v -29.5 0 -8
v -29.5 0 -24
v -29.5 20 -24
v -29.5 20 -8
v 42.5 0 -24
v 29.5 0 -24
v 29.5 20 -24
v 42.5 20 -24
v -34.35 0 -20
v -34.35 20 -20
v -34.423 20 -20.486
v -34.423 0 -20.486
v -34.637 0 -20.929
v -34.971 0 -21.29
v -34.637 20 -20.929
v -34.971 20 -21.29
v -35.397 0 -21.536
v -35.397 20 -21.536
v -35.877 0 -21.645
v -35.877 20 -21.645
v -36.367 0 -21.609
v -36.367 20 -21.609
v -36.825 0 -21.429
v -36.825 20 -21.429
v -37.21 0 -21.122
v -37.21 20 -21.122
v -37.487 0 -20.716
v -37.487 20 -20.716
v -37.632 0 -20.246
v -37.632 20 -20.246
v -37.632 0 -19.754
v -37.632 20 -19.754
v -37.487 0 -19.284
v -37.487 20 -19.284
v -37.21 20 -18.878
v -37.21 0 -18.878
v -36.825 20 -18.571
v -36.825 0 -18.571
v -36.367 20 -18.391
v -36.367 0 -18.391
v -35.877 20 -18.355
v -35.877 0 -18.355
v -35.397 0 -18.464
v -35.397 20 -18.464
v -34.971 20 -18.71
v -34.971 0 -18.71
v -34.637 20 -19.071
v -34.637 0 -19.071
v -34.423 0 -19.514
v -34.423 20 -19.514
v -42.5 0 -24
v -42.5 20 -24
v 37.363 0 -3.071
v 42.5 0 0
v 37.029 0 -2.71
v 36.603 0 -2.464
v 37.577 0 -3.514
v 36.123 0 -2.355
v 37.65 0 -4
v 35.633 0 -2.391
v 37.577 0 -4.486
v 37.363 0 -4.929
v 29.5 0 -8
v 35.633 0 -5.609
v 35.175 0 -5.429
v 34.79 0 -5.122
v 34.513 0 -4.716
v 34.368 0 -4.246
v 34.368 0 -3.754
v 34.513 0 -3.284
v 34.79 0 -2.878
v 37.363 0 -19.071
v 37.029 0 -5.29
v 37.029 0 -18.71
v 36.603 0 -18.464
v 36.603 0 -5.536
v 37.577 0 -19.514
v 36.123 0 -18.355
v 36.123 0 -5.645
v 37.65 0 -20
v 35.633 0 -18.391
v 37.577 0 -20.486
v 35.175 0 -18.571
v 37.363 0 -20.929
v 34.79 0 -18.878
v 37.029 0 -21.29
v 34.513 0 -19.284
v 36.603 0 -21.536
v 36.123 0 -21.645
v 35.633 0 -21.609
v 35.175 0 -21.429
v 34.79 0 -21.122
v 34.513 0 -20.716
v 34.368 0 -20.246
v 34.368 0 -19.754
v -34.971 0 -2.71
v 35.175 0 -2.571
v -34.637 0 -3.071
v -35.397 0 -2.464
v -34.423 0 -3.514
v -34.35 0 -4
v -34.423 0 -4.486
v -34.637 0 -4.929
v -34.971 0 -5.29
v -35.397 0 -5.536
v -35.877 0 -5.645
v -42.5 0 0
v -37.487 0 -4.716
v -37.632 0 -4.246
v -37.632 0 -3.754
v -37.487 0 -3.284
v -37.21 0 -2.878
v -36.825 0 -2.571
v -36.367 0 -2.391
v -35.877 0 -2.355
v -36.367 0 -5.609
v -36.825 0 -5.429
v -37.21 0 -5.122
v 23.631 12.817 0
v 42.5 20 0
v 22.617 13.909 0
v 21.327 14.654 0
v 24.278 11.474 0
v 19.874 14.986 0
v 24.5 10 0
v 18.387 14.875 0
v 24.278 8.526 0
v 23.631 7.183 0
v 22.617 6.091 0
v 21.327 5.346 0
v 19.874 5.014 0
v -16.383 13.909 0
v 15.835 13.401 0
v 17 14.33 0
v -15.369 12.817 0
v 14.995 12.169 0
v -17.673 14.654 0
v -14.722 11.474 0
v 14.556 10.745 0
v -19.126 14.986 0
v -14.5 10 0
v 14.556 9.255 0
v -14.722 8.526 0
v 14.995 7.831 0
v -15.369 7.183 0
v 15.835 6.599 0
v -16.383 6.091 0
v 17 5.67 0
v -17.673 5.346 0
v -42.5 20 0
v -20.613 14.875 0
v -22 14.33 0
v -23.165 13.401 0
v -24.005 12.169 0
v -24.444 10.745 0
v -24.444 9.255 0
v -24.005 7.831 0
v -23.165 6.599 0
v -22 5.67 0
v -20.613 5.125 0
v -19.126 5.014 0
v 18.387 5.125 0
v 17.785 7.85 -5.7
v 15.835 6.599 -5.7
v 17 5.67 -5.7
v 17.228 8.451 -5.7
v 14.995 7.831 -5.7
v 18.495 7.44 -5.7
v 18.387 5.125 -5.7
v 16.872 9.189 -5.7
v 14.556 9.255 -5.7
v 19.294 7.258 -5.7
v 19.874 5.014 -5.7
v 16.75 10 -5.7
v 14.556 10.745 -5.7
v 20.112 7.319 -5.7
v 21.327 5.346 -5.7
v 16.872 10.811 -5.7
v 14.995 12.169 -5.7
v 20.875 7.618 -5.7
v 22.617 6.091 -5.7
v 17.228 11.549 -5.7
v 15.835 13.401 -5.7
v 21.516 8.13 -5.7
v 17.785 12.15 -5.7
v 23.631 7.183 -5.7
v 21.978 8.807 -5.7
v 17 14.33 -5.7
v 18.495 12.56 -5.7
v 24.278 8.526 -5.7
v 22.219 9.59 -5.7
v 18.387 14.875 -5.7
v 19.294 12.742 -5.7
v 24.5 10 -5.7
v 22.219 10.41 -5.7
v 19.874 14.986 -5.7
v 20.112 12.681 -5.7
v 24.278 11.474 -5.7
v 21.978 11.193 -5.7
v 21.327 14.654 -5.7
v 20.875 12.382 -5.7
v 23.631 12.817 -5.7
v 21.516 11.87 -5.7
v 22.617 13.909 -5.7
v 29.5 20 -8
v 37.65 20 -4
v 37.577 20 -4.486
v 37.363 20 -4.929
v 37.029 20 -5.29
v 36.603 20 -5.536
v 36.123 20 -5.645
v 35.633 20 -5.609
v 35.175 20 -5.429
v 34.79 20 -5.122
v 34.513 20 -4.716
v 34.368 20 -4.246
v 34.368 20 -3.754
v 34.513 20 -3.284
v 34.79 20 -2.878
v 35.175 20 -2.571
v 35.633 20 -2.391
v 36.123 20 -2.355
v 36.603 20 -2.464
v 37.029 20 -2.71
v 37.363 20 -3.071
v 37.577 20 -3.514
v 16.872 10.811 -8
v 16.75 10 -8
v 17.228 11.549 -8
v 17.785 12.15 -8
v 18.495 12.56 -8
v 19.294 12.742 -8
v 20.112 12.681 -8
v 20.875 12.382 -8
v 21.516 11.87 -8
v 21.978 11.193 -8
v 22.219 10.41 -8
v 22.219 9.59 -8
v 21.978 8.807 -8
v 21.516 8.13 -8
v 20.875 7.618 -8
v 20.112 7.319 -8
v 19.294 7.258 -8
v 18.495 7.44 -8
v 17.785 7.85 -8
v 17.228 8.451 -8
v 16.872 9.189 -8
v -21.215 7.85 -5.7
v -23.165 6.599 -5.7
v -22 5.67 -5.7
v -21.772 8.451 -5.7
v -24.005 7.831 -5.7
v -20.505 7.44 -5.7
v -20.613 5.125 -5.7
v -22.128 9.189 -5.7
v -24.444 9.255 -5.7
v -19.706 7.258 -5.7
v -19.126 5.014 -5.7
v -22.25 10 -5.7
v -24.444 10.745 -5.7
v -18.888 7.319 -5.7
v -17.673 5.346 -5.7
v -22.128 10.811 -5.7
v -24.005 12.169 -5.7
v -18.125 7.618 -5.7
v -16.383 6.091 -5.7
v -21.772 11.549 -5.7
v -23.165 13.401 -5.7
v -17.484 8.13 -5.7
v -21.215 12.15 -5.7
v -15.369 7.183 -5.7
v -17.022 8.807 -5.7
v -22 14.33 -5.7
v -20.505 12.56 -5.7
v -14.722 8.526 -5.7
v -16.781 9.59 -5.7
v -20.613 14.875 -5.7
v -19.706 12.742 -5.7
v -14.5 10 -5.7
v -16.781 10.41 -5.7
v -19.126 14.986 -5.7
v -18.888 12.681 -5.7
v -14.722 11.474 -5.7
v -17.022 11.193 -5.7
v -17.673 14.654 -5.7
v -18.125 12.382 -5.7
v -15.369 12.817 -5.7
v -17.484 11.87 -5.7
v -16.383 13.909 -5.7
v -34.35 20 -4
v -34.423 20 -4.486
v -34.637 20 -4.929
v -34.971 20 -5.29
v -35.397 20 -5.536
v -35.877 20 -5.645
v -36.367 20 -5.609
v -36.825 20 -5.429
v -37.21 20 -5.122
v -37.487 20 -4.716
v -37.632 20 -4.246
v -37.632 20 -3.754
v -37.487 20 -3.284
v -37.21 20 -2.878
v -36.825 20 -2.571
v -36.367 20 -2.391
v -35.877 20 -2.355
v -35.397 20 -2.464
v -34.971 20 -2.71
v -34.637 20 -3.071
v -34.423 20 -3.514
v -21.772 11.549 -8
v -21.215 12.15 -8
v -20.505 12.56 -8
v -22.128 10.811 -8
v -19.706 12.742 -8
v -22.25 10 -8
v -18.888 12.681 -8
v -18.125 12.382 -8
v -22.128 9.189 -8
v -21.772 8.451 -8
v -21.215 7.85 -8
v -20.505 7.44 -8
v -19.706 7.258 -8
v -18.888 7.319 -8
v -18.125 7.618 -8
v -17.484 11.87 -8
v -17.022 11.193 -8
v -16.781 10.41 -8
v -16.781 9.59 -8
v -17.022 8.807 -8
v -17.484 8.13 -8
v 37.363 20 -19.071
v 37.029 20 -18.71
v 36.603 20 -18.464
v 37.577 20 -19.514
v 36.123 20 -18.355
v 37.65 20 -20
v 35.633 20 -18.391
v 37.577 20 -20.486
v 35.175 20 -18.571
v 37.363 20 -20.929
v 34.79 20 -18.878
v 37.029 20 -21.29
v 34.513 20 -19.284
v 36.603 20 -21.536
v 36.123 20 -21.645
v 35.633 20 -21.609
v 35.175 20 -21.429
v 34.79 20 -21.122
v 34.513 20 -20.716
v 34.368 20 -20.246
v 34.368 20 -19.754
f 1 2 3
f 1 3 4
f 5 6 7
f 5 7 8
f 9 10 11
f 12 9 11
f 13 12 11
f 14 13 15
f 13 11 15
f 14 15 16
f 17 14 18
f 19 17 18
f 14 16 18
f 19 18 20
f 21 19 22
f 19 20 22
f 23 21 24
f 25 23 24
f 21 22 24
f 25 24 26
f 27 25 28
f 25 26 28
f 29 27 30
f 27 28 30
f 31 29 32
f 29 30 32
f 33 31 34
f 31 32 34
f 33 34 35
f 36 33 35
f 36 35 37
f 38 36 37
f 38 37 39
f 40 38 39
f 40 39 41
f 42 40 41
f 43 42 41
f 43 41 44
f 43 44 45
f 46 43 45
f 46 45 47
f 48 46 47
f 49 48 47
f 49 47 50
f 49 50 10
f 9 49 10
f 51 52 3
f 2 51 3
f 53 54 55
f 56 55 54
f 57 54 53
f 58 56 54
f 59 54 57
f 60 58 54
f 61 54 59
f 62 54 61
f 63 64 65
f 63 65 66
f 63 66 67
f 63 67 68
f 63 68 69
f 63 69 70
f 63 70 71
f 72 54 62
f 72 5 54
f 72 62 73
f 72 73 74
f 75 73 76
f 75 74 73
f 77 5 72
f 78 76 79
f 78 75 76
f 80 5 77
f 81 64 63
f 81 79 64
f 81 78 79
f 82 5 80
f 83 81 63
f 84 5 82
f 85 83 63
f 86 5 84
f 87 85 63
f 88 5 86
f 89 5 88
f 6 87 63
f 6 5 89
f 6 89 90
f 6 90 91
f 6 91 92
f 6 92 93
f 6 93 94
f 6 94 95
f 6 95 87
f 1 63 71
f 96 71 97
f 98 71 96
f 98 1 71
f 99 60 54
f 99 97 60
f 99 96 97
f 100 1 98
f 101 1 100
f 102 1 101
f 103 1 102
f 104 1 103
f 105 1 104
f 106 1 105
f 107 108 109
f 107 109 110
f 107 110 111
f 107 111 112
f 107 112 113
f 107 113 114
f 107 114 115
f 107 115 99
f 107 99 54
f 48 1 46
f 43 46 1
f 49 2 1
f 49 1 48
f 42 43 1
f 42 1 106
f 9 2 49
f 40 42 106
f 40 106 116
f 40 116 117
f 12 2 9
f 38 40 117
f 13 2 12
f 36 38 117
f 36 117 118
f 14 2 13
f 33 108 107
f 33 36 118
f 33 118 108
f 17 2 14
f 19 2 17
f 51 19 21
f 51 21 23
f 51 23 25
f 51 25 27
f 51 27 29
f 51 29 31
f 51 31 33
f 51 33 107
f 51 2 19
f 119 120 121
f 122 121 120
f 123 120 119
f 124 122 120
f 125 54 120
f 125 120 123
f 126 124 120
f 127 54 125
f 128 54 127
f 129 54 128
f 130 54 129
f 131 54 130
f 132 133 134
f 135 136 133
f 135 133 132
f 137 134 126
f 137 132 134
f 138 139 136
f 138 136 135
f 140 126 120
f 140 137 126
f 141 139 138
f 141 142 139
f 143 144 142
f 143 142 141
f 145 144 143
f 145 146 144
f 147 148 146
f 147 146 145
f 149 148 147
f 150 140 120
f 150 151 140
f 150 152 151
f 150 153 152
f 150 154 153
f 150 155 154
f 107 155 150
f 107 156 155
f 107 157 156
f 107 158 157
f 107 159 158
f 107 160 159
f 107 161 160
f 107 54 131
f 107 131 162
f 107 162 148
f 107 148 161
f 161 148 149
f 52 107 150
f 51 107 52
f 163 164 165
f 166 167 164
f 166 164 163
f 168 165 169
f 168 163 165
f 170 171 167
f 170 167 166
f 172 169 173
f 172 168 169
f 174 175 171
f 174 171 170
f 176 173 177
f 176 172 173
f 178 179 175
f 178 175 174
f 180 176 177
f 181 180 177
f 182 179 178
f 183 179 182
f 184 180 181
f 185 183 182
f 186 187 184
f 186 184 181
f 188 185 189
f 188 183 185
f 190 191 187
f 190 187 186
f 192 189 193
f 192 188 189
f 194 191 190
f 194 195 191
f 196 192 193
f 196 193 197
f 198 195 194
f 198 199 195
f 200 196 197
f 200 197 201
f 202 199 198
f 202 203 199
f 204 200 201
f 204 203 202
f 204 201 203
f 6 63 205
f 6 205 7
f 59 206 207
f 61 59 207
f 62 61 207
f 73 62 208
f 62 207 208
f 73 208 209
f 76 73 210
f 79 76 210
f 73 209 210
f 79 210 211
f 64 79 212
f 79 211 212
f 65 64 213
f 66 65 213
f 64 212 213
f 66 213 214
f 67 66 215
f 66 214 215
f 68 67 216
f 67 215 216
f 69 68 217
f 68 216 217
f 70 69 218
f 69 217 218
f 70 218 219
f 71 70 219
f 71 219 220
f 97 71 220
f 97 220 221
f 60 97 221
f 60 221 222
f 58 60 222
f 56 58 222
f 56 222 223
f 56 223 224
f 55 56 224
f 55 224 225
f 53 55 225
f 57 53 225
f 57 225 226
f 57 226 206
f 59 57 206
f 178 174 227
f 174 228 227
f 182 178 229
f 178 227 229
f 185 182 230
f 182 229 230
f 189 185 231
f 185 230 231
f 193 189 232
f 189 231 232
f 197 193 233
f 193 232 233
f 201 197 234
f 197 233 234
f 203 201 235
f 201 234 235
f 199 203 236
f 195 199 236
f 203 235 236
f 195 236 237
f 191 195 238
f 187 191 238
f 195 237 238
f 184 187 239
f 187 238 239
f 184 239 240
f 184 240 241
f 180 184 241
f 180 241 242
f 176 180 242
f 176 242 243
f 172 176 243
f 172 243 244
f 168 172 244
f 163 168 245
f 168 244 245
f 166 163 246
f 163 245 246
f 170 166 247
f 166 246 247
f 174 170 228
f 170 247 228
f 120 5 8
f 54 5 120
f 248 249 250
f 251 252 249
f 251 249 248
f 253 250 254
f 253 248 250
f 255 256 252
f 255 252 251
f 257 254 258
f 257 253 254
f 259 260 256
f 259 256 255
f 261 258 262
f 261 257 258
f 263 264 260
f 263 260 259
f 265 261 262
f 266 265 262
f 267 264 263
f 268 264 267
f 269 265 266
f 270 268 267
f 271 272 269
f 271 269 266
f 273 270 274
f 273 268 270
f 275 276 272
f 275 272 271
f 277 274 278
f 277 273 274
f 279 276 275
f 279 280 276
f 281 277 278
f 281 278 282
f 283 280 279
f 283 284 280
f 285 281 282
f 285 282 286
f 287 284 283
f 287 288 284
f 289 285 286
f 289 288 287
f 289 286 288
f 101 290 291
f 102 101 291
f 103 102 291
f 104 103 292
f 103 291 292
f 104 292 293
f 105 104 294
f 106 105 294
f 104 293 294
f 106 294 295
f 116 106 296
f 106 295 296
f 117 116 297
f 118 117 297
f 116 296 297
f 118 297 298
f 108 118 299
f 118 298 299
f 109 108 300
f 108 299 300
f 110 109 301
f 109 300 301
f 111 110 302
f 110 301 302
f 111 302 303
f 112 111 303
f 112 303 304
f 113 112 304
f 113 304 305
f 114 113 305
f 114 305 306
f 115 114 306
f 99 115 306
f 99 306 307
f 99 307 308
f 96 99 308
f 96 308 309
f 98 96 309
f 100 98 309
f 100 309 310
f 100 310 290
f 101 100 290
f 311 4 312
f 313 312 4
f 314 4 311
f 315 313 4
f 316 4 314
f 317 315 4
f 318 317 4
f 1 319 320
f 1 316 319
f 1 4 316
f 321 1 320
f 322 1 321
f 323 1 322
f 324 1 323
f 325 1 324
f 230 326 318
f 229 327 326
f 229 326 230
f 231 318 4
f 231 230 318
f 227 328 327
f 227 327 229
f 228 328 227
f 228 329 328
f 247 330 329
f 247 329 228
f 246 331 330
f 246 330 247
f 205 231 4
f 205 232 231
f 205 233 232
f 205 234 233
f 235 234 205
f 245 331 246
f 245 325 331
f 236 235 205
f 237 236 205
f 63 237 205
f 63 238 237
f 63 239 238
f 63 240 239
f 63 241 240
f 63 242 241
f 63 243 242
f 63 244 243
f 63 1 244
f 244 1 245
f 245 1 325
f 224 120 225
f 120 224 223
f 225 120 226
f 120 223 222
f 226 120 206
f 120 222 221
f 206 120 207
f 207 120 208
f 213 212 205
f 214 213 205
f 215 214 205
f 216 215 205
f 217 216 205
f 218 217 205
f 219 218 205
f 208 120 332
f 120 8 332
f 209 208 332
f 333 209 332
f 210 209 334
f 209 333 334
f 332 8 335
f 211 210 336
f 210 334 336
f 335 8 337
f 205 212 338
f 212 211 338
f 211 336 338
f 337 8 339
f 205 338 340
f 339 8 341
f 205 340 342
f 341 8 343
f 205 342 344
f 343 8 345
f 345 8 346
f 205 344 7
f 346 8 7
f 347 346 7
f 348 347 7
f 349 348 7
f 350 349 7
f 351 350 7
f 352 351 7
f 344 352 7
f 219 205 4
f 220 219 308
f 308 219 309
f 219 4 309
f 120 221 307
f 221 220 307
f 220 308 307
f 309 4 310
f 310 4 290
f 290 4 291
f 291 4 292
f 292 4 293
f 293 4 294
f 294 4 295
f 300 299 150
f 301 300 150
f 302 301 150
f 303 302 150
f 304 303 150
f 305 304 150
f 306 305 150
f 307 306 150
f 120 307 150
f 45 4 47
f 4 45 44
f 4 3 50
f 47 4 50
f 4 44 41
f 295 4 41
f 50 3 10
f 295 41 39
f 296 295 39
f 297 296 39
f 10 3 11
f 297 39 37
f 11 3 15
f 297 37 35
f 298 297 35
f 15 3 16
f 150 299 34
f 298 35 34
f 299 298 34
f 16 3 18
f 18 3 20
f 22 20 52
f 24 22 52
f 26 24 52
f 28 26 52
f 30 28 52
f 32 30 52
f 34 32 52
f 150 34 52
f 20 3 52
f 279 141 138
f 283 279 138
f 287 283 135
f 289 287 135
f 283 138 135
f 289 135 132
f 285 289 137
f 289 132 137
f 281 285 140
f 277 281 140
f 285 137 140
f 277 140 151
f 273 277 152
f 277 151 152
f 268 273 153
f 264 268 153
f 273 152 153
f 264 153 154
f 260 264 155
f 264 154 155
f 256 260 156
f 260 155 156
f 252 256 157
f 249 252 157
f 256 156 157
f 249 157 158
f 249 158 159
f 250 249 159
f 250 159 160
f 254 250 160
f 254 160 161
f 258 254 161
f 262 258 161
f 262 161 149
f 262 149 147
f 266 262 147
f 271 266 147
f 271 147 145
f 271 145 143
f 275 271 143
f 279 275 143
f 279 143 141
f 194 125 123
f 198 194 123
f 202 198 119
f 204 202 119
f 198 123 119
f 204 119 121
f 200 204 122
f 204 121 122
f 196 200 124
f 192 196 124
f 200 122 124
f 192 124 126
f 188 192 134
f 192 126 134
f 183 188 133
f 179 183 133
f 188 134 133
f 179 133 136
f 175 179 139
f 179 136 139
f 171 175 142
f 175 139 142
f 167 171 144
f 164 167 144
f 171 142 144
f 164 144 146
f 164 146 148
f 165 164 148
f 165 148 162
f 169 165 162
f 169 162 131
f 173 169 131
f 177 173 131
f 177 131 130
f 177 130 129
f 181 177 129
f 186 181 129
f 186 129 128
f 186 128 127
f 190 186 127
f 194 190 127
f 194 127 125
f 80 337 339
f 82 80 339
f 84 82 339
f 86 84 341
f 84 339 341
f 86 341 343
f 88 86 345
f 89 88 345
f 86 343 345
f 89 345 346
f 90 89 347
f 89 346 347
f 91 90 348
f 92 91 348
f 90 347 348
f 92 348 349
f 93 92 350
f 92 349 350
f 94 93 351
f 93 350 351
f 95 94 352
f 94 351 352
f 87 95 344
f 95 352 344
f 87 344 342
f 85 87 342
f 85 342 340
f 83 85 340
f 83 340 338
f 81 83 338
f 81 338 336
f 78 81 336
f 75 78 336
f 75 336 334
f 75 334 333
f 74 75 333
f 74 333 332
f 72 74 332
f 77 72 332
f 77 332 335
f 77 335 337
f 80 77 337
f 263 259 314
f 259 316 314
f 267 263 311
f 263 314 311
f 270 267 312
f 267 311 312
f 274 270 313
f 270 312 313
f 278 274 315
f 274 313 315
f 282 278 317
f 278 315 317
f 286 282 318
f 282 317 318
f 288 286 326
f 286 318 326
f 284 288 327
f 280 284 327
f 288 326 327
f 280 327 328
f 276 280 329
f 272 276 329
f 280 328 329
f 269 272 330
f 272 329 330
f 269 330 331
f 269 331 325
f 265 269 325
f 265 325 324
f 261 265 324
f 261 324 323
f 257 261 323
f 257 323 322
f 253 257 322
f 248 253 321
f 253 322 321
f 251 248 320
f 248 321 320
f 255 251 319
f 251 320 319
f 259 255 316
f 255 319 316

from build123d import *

# Parameters (mm, degrees)
EXTRUDE_1_DEPTH           = 20
HOLE_WIZARD_0_D           = 5.5
HOLE_WIZARD_0_CBORE_D     = 10
HOLE_WIZARD_0_CBORE_DEPTH = 5.7
HOLE_WIZARD_M4_1_D        = 3.3


with BuildPart() as part:
    # 草图1 → 凸台-拉伸1 (new body)
    with BuildSketch(Plane(origin=(0, 0, 0), x_dir=(1, 0, 0), z_dir=(0, 1, 0))):
        Polygon((-42.5, 24), (-29.5, 24), (-29.5, 8), (29.5, 8), (29.5, 24), (42.5, 24), (42.5, 0), (-42.5, 0), align=None)
    extrude(amount=EXTRUDE_1_DEPTH)

    # 打孔尺寸(%根据)内六角圆柱头螺钉的类型0 (through all)
    with Locations(Plane.XY):
        with Locations((19.5, 10), (-19.5, 10)):
            CounterBoreHole(HOLE_WIZARD_0_D / 2, HOLE_WIZARD_0_CBORE_D / 2, HOLE_WIZARD_0_CBORE_DEPTH)

    # M4 螺纹孔1 (through all)
    with Locations(Plane(origin=(0, 0, 0), x_dir=(-1, 0, 0), z_dir=(0, -1, 0))):
        with Locations((36, 4), (-36, 4), (36, 20), (-36, 20)):
            Hole(HOLE_WIZARD_M4_1_D / 2)


solid = part.part
